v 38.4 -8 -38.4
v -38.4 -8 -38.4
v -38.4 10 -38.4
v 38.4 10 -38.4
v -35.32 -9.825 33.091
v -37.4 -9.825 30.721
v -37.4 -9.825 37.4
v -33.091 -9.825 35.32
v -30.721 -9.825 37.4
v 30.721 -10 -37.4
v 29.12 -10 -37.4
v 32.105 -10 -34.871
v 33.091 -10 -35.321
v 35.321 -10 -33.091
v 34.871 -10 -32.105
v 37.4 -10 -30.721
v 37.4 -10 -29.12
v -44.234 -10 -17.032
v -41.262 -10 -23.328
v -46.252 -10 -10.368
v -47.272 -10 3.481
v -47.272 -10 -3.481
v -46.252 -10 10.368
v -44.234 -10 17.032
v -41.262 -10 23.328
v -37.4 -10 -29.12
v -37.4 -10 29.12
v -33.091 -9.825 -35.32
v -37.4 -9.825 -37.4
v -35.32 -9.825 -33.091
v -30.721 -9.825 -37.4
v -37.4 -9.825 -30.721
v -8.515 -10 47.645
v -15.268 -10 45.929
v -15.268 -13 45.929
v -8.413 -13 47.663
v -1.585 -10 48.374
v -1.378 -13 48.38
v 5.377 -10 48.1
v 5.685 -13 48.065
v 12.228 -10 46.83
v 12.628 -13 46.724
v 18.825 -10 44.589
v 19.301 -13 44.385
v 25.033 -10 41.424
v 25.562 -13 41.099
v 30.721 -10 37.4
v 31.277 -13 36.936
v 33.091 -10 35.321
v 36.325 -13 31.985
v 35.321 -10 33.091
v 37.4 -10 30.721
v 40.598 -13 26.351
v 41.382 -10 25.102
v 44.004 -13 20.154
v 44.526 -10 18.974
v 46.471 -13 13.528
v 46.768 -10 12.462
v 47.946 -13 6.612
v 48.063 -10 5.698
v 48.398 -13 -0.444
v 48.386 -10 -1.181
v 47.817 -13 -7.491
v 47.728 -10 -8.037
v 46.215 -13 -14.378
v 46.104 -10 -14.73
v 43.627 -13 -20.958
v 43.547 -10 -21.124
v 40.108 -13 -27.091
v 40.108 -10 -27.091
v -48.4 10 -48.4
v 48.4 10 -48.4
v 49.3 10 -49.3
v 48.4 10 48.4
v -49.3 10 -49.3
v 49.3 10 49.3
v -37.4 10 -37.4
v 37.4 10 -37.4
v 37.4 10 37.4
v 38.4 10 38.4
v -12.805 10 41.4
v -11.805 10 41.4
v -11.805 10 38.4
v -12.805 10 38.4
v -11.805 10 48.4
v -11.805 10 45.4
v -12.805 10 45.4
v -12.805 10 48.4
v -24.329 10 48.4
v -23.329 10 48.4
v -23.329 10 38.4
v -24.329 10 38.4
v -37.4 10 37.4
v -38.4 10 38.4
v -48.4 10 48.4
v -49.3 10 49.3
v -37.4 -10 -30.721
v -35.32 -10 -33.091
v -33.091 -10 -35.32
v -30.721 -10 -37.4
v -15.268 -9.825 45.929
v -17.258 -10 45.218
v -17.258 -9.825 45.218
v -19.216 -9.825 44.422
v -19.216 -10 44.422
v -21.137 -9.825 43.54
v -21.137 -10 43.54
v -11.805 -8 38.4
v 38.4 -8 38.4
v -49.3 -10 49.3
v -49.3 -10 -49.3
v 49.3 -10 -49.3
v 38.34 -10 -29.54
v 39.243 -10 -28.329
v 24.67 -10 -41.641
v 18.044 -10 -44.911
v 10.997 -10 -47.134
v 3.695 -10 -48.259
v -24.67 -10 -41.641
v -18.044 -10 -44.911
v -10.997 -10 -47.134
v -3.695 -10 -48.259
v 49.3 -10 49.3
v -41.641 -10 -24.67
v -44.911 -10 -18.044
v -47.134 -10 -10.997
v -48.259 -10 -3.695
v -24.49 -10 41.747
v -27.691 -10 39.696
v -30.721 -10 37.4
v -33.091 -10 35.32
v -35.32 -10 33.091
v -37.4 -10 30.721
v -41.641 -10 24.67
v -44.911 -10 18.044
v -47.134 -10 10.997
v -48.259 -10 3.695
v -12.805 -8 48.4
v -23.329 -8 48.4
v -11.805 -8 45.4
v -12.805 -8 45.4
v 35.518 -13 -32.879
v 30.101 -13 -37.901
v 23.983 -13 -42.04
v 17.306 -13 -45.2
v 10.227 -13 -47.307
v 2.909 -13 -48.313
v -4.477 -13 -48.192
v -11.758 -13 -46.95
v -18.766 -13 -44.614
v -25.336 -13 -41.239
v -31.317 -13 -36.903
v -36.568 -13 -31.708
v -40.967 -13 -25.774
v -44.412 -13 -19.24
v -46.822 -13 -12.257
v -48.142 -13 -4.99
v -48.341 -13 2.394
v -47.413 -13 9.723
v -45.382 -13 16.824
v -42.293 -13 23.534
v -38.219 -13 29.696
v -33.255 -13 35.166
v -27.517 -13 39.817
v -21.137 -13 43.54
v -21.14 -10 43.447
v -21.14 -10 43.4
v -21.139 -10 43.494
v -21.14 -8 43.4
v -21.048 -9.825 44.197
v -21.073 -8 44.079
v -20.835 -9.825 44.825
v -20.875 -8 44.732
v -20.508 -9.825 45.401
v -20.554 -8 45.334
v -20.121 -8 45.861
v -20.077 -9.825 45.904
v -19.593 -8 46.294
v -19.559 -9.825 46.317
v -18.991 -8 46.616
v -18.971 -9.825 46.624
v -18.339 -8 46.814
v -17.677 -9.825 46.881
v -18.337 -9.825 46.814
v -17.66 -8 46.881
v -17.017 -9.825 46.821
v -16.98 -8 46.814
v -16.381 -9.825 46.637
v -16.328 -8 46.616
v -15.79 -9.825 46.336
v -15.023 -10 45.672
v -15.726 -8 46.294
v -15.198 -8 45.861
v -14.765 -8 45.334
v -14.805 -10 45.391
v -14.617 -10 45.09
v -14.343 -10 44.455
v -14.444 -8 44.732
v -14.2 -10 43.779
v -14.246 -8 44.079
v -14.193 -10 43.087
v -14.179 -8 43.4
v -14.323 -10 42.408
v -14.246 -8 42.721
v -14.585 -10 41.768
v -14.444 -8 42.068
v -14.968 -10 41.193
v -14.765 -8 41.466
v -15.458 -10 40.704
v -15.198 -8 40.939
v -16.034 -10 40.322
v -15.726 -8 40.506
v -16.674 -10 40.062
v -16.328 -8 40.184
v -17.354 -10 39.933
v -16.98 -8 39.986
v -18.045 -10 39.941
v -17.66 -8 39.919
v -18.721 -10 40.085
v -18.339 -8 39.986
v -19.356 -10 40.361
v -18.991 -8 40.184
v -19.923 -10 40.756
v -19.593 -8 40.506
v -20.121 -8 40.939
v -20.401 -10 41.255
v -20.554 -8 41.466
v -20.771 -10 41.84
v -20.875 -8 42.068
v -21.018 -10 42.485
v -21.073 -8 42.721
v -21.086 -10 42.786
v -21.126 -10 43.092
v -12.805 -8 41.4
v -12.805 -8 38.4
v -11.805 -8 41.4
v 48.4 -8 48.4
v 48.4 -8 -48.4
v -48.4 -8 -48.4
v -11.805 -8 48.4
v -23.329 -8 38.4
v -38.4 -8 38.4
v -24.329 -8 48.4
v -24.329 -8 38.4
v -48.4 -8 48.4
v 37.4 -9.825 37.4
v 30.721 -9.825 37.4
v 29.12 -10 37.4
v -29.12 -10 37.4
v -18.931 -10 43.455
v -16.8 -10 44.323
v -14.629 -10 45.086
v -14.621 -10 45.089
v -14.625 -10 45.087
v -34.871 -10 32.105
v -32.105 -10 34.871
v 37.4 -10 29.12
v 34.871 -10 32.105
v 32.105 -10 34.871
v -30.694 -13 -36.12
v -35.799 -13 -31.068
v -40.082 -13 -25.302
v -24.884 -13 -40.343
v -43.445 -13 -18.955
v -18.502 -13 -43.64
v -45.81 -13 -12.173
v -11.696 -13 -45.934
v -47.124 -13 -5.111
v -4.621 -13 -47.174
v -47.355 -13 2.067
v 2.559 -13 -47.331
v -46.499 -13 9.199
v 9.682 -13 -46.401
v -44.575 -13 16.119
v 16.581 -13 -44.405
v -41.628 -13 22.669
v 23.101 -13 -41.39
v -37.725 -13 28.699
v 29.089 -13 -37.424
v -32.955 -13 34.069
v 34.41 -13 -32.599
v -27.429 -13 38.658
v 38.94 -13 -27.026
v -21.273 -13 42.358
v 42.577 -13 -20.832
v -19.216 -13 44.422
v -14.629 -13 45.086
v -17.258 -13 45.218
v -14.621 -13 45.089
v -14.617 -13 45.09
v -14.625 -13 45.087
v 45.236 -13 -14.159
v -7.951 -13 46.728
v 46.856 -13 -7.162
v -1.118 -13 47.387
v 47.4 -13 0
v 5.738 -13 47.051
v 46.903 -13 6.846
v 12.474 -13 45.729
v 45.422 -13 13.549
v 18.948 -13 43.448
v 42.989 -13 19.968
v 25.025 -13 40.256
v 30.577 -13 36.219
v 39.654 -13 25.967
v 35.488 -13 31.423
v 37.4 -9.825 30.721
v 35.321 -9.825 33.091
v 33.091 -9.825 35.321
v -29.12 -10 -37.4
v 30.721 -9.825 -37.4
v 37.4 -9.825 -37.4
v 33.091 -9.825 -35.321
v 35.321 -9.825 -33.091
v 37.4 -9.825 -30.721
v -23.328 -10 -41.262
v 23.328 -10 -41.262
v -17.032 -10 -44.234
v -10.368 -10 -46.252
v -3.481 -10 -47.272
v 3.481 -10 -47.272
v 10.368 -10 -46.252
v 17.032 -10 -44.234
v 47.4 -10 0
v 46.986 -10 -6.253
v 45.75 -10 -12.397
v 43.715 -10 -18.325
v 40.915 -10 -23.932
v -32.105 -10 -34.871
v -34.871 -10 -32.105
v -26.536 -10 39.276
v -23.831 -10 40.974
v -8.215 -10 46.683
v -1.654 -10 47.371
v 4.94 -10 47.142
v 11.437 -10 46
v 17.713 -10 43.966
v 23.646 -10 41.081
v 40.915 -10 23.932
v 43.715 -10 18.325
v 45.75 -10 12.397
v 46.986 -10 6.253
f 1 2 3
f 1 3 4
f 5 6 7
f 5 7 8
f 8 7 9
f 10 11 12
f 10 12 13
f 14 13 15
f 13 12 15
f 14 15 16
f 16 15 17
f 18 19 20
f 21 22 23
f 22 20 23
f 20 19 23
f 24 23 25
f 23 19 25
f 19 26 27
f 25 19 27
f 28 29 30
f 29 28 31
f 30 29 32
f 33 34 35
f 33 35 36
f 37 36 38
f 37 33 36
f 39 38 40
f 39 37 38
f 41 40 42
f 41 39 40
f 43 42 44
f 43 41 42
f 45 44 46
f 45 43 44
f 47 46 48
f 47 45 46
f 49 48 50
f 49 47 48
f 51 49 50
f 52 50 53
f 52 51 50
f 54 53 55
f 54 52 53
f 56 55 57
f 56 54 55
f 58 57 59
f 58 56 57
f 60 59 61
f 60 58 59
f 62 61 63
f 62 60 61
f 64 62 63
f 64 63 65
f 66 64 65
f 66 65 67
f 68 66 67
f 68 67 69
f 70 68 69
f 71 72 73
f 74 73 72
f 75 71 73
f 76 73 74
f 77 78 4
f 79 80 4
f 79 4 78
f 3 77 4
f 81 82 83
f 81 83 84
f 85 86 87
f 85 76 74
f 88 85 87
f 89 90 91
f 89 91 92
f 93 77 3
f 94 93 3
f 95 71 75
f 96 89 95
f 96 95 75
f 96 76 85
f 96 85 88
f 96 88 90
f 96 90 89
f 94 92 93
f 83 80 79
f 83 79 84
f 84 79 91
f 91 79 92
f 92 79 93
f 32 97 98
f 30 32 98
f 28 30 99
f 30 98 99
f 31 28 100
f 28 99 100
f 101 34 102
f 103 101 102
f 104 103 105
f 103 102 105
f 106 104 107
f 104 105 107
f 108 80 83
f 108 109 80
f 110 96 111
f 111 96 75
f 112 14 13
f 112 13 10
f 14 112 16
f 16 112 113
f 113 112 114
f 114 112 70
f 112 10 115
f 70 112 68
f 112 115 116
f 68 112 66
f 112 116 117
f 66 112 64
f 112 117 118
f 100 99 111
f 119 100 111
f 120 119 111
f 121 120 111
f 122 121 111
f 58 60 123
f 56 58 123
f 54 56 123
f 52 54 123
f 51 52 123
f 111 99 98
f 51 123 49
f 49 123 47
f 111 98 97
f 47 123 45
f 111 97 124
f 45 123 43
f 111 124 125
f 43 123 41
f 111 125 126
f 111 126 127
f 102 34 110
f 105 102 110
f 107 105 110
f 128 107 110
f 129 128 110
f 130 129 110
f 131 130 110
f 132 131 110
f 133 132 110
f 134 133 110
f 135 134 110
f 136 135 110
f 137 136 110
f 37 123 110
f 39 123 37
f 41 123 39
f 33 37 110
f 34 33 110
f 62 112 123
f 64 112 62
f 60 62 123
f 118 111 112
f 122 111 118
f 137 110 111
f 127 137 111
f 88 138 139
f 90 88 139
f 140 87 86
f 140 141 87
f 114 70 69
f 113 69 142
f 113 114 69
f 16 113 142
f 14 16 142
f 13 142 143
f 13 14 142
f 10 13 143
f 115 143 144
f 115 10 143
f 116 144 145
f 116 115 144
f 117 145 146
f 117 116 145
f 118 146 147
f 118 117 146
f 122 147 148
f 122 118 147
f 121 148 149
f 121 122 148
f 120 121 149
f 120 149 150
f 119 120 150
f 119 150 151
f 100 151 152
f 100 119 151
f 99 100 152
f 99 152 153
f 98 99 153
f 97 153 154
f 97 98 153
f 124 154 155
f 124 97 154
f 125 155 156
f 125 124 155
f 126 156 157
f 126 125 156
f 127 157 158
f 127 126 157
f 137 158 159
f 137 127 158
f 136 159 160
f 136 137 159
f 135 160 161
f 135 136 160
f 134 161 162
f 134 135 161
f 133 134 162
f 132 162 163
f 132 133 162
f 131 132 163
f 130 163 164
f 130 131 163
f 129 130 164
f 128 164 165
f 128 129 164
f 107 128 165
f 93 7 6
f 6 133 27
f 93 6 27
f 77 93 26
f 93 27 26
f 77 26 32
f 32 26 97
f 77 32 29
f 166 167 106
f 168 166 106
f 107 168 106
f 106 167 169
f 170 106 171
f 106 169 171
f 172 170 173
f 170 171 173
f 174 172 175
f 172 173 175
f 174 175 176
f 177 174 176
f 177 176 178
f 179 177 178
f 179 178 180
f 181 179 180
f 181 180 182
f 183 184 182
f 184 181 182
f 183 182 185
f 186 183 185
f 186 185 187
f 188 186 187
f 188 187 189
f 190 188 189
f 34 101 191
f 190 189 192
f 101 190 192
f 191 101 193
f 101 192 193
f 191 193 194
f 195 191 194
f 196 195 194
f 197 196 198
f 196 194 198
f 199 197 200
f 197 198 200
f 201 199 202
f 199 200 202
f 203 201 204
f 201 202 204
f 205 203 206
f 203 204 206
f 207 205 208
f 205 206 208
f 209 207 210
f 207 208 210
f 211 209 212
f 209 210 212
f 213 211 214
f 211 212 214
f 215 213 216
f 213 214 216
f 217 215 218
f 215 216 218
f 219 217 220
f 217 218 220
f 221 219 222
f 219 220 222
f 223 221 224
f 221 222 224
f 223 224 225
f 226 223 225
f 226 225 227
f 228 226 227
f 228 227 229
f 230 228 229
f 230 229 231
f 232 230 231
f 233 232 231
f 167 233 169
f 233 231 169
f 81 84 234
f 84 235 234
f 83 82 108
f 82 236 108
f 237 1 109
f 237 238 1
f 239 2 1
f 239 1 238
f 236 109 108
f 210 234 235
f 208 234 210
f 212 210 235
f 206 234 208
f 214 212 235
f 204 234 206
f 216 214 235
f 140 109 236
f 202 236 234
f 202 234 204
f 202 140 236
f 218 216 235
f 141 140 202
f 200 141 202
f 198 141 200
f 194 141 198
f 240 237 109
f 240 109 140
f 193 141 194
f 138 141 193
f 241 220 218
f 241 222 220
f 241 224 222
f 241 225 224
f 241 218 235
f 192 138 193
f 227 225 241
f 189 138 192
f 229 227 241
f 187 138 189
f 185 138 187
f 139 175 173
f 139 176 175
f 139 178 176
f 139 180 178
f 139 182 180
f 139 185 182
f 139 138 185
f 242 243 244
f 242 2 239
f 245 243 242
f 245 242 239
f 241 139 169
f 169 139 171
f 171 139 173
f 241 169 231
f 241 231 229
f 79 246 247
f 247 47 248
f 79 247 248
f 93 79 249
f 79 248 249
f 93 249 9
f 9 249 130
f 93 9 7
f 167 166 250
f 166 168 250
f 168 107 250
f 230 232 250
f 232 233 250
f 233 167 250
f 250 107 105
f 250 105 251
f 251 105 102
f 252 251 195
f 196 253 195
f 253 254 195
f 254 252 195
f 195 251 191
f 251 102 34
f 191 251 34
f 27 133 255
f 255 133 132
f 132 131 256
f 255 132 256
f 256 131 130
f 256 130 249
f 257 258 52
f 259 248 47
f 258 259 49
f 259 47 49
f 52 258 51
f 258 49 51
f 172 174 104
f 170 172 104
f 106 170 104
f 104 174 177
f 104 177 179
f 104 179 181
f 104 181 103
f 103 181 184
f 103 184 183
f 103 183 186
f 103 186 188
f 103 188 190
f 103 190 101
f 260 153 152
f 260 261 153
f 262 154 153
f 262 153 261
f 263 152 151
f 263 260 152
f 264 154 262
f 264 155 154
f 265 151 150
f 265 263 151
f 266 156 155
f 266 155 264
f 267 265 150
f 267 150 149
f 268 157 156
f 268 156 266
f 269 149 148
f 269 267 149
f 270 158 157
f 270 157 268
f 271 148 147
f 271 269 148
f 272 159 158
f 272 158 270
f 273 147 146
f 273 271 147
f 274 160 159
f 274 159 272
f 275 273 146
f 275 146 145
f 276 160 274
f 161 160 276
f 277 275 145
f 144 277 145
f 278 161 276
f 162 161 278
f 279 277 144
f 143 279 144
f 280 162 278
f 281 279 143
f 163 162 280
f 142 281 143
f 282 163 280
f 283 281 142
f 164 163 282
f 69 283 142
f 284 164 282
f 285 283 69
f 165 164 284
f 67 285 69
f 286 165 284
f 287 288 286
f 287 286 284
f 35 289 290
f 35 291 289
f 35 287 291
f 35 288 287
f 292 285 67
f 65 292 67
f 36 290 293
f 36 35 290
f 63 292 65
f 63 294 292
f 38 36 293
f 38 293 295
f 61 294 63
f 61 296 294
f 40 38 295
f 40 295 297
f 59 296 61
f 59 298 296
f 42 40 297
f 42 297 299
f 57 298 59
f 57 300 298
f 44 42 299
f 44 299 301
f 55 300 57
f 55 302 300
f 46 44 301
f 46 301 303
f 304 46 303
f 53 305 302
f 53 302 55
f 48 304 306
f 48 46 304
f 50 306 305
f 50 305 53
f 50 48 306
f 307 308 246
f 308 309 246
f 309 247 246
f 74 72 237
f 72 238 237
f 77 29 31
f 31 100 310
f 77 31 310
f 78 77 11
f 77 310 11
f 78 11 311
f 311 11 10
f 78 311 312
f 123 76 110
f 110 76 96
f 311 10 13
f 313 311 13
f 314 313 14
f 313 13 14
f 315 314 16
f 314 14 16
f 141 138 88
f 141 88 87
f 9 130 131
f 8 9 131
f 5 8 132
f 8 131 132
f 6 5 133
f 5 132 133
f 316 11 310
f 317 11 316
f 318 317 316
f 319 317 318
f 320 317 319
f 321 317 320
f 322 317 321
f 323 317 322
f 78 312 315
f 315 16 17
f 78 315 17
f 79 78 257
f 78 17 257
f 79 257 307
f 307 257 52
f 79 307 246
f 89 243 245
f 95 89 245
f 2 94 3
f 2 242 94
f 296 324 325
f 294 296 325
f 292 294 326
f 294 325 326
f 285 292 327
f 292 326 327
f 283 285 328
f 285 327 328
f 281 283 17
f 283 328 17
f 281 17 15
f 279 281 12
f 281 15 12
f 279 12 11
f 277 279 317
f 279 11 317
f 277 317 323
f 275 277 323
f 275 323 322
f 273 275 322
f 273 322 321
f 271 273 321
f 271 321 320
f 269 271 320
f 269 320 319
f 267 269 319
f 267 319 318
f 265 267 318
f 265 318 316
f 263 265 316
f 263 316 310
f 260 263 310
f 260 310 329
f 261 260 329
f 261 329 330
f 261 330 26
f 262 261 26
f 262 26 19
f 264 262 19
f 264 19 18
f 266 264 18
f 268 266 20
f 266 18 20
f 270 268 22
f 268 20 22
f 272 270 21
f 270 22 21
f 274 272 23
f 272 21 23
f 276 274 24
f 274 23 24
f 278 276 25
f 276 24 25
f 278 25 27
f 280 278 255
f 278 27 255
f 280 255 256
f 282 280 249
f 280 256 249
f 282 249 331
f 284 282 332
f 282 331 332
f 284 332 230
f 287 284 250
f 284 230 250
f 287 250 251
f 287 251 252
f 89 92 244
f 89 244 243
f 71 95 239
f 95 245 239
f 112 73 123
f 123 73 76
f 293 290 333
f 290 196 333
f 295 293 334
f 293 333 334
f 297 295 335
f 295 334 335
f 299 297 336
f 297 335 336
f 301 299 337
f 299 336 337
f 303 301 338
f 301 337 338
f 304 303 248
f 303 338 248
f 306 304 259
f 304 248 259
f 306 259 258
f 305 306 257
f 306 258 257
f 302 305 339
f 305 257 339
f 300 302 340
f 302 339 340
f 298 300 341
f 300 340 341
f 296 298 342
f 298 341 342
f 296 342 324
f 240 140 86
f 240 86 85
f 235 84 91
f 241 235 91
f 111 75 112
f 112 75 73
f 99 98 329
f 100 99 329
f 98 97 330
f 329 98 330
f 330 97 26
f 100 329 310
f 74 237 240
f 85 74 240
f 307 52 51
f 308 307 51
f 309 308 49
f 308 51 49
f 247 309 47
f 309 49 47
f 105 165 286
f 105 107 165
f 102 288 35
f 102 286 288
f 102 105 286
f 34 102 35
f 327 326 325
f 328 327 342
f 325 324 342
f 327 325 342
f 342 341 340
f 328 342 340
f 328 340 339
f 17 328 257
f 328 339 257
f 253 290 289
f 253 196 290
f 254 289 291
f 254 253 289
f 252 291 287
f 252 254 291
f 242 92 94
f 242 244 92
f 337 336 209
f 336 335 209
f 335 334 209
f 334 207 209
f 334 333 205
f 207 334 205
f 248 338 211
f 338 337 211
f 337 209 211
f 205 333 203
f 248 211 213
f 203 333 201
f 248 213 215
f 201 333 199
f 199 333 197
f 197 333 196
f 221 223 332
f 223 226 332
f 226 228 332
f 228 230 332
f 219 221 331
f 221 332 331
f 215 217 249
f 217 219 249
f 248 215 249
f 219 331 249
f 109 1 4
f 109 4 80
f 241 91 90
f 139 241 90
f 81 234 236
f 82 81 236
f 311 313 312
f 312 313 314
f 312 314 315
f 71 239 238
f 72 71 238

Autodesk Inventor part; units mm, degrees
ref_plane "YZ Plane" through (0, 0, 0) normal (1, 0, 0) x (0, 1, 0)
ref_plane "XZ Plane" through (0, 0, 0) normal (0, 1, 0) x (-1, 0, 0)
ref_plane "XY Plane" through (0, 0, 0) normal (0, 0, 1) x (1, 0, 0)
sketch "Sketch1" plane through (0, 0, 0) normal (0, 1, 0) x (-1, 0, 0)
  line L0 (49.3, -49.3) -> (-49.3, -49.3)
  line L1 (-49.3, -49.3) -> (-49.3, 49.3)
  line L2 (-49.3, 49.3) -> (49.3, 49.3)
  line L3 (49.3, 49.3) -> (49.3, -49.3)
  line L4 (49.3, -49.3) -> (-49.3, 49.3) construction
  line L5 (-49.3, -49.3) -> (49.3, 49.3) construction
  line L6 (48.4, -48.4) -> (-48.4, -48.4)
  line L7 (-48.4, -48.4) -> (-48.4, 48.4)
  line L8 (-48.4, 48.4) -> (48.4, 48.4)
  line L9 (48.4, 48.4) -> (48.4, -48.4)
  line L10 (48.4, -48.4) -> (-48.4, 48.4) construction
  line L11 (-48.4, -48.4) -> (48.4, 48.4) construction
  line L12 (38.4, -38.4) -> (-38.4, -38.4)
  line L13 (-38.4, -38.4) -> (-38.4, 38.4)
  line L14 (-38.4, 38.4) -> (38.4, 38.4)
  line L15 (38.4, 38.4) -> (38.4, -38.4)
  line L16 (38.4, -38.4) -> (-38.4, 38.4) construction
  line L17 (-38.4, -38.4) -> (38.4, 38.4) construction
  line L18 (37.4, -37.4) -> (-37.4, -37.4)
  line L19 (-37.4, -37.4) -> (-37.4, 37.4)
  line L20 (-37.4, 37.4) -> (37.4, 37.4)
  line L21 (37.4, 37.4) -> (37.4, -37.4)
  line L22 (37.4, -37.4) -> (-37.4, 37.4) construction
  line L23 (-37.4, -37.4) -> (37.4, 37.4) construction
  line L24 (24.3286, 38.4) -> (24.3286, 48.4)
  line L25 (24.3286, 38.4) -> (23.3286, 38.4)
  line L26 (23.3286, 38.4) -> (23.3286, 48.4)
  line L27 (24.3286, 48.4) -> (23.3286, 48.4)
  circle A0 centre (17.6595, 43.4) radius 3.4806
  line L28 (12.8049, 38.4) -> (12.8049, 41.4)
  line L29 (12.8049, 41.4) -> (11.8049, 41.4)
  line L30 (11.8049, 41.4) -> (11.8049, 38.4)
  line L31 (12.8049, 48.4) -> (12.8049, 45.4)
  line L32 (12.8049, 45.4) -> (11.8049, 45.4)
  line L33 (11.8049, 45.4) -> (11.8049, 48.4)
  point P0 (0, 0)
  dimension "d0" = 98.6
  dimension "d1" = 98.6
  dimension "d2" = 96.8
  dimension "d3" = 96.8
  dimension "d4" = 76.8
  dimension "d5" = 76.8
  dimension "d6" = 74.8
  dimension "d7" = 74.8
  dimension "d8" = 10
  dimension "d9" = 1
  dimension "d10" = 3
  dimension "d11" = 1
  dimension "d12" = 3
extrude "Extrusion1" add sketch "Sketch1" along normal mid plane 20 contours L0 L1 L2 L3 | L6 L7 L8 L33 L32 L31 L26 L14 L28 L29 L30 L13 L12 L15 L24 L9 | L24 L14 L26 L8 | L8 L31 L32 L33 | L14 L15 L12 L13 | L14 L30 L29 L28 | L18 L19 L20 L21 | A0
extrude "Extrusion2" cut sketch "Sketch1" along normal mid plane 29.525 contours L18 L19 L20 L21
extrude "Extrusion3" cut sketch "Sketch1" along normal blind 29.525 and the other way blind 8 contours L6 L7 L8 L33 L32 L31 L26 L14 L28 L29 L30 L13 L12 L15 L24 L9
extrude "Extrusion4" cut sketch "Sketch1" along normal blind 29.525 and the other way blind 14.763 contours A0
sketch "Sketch2" plane through (0, -10, 0) normal (0, -1, 0) x (1, 0, 0)
  arc A0 (40.1076, -27.0913) -> (-15.2678, 45.9288) centre (0, 0) ccw
  arc A1 (-14.6167, 45.09) -> (-14.6288, 45.0861) centre (0, 0) ccw
  circle A2 centre (-17.6595, 43.4) radius 3.4806 projected
  line L0 (-14.6288, 45.0861) -> (-14.5793, 45.0208)
  circle A3 centre (0, 0) radius 47.4
  arc A4 (-15.2678, 45.9288) -> (-21.1372, 43.5405) centre (0, 0) ccw
  circle A5 centre (0, 0) radius 48.4
  arc A6 (-14.5793, 45.0208) -> (-14.6167, 45.09) centre (-17.6595, 43.4) ccw
  arc A7 (-15.2678, 45.9288) -> (-21.1372, 43.5405) centre (-17.6595, 43.4) ccw
  point P0 (-14.6167, 45.09)
  point P1 (-15.2678, 45.9288)
  point P2 (-14.6167, 45.09)
  dimension "d25" = 96.8
  dimension "d26" = 94.8
sketch "Sketch3" plane through (0, -10, 0) normal (0, -1, 0) x (1, 0, 0)
  arc A0 (-21.1372, 43.5405) -> (-15.2678, 45.9288) centre (0, 0) ccw projected
  line L0 (37.4, -37.4) -> (37.4, 37.4) projected
  line L1 (37.4, -29.1204) -> (37.4, -30.7213) projected
  line L2 (37.4, -30.7213) -> (37.4, -37.4)
  line L3 (37.4, -37.4) -> (-37.4, -37.4) projected
  line L4 (37.4, -37.4) -> (30.7213, -37.4)
  arc A1 (-37.4, -30.7213) -> (-30.7213, -37.4) centre (0, 0) ccw projected
  line L5 (-37.4, -37.4) -> (-30.7213, -37.4)
  arc A2 (-37.4, 30.7213) -> (-37.4, -30.7213) centre (0, 0) ccw projected
  line L6 (-37.4, -37.4) -> (-37.4, -30.7213)
  line L7 (-37.4, 37.4) -> (-37.4, -37.4) projected
  line L8 (-37.4, 30.7213) -> (-37.4, 37.4)
  line L9 (-37.4, 37.4) -> (37.4, 37.4) projected
  line L10 (-37.4, 37.4) -> (-30.7213, 37.4)
  arc A3 (37.4, 30.7213) -> (30.7213, 37.4) centre (0, 0) ccw projected
  line L11 (37.4, 37.4) -> (37.4, -37.4) projected
  line L12 (37.4, 30.7213) -> (37.4, 37.4)
  line L13 (-37.4, 37.4) -> (37.4, 37.4) projected
  line L14 (37.4, 37.4) -> (30.7213, 37.4)
  arc A4 (30.7213, -37.4) -> (37.4, -30.7213) centre (0, 0) ccw
  arc A5 (-37.4, -30.7213) -> (-30.7213, -37.4) centre (0, 0) ccw
  arc A6 (37.4, 30.7213) -> (30.7213, 37.4) centre (0, 0) ccw
  arc A7 (-30.7213, 37.4) -> (-37.4, 30.7213) centre (0, 0) ccw
  point P0 (37.4, 30.7213)
  point P1 (37.4, -30.7213)
extrude "Extrusion6" add sketch "Sketch3" against normal blind 0.175 contours A0 L7 L9 | L9 L0 A0 | A0 L3 L6 | L0 L3 A0
extrude "Extrusion8" add sketch "Sketch2" against normal blind 0.175 contours A2 A4
extrude "Extrusion9" add sketch "Sketch2" along normal blind 3 contours A5 A2 A3 A0 | A4 A2 A1 A3
